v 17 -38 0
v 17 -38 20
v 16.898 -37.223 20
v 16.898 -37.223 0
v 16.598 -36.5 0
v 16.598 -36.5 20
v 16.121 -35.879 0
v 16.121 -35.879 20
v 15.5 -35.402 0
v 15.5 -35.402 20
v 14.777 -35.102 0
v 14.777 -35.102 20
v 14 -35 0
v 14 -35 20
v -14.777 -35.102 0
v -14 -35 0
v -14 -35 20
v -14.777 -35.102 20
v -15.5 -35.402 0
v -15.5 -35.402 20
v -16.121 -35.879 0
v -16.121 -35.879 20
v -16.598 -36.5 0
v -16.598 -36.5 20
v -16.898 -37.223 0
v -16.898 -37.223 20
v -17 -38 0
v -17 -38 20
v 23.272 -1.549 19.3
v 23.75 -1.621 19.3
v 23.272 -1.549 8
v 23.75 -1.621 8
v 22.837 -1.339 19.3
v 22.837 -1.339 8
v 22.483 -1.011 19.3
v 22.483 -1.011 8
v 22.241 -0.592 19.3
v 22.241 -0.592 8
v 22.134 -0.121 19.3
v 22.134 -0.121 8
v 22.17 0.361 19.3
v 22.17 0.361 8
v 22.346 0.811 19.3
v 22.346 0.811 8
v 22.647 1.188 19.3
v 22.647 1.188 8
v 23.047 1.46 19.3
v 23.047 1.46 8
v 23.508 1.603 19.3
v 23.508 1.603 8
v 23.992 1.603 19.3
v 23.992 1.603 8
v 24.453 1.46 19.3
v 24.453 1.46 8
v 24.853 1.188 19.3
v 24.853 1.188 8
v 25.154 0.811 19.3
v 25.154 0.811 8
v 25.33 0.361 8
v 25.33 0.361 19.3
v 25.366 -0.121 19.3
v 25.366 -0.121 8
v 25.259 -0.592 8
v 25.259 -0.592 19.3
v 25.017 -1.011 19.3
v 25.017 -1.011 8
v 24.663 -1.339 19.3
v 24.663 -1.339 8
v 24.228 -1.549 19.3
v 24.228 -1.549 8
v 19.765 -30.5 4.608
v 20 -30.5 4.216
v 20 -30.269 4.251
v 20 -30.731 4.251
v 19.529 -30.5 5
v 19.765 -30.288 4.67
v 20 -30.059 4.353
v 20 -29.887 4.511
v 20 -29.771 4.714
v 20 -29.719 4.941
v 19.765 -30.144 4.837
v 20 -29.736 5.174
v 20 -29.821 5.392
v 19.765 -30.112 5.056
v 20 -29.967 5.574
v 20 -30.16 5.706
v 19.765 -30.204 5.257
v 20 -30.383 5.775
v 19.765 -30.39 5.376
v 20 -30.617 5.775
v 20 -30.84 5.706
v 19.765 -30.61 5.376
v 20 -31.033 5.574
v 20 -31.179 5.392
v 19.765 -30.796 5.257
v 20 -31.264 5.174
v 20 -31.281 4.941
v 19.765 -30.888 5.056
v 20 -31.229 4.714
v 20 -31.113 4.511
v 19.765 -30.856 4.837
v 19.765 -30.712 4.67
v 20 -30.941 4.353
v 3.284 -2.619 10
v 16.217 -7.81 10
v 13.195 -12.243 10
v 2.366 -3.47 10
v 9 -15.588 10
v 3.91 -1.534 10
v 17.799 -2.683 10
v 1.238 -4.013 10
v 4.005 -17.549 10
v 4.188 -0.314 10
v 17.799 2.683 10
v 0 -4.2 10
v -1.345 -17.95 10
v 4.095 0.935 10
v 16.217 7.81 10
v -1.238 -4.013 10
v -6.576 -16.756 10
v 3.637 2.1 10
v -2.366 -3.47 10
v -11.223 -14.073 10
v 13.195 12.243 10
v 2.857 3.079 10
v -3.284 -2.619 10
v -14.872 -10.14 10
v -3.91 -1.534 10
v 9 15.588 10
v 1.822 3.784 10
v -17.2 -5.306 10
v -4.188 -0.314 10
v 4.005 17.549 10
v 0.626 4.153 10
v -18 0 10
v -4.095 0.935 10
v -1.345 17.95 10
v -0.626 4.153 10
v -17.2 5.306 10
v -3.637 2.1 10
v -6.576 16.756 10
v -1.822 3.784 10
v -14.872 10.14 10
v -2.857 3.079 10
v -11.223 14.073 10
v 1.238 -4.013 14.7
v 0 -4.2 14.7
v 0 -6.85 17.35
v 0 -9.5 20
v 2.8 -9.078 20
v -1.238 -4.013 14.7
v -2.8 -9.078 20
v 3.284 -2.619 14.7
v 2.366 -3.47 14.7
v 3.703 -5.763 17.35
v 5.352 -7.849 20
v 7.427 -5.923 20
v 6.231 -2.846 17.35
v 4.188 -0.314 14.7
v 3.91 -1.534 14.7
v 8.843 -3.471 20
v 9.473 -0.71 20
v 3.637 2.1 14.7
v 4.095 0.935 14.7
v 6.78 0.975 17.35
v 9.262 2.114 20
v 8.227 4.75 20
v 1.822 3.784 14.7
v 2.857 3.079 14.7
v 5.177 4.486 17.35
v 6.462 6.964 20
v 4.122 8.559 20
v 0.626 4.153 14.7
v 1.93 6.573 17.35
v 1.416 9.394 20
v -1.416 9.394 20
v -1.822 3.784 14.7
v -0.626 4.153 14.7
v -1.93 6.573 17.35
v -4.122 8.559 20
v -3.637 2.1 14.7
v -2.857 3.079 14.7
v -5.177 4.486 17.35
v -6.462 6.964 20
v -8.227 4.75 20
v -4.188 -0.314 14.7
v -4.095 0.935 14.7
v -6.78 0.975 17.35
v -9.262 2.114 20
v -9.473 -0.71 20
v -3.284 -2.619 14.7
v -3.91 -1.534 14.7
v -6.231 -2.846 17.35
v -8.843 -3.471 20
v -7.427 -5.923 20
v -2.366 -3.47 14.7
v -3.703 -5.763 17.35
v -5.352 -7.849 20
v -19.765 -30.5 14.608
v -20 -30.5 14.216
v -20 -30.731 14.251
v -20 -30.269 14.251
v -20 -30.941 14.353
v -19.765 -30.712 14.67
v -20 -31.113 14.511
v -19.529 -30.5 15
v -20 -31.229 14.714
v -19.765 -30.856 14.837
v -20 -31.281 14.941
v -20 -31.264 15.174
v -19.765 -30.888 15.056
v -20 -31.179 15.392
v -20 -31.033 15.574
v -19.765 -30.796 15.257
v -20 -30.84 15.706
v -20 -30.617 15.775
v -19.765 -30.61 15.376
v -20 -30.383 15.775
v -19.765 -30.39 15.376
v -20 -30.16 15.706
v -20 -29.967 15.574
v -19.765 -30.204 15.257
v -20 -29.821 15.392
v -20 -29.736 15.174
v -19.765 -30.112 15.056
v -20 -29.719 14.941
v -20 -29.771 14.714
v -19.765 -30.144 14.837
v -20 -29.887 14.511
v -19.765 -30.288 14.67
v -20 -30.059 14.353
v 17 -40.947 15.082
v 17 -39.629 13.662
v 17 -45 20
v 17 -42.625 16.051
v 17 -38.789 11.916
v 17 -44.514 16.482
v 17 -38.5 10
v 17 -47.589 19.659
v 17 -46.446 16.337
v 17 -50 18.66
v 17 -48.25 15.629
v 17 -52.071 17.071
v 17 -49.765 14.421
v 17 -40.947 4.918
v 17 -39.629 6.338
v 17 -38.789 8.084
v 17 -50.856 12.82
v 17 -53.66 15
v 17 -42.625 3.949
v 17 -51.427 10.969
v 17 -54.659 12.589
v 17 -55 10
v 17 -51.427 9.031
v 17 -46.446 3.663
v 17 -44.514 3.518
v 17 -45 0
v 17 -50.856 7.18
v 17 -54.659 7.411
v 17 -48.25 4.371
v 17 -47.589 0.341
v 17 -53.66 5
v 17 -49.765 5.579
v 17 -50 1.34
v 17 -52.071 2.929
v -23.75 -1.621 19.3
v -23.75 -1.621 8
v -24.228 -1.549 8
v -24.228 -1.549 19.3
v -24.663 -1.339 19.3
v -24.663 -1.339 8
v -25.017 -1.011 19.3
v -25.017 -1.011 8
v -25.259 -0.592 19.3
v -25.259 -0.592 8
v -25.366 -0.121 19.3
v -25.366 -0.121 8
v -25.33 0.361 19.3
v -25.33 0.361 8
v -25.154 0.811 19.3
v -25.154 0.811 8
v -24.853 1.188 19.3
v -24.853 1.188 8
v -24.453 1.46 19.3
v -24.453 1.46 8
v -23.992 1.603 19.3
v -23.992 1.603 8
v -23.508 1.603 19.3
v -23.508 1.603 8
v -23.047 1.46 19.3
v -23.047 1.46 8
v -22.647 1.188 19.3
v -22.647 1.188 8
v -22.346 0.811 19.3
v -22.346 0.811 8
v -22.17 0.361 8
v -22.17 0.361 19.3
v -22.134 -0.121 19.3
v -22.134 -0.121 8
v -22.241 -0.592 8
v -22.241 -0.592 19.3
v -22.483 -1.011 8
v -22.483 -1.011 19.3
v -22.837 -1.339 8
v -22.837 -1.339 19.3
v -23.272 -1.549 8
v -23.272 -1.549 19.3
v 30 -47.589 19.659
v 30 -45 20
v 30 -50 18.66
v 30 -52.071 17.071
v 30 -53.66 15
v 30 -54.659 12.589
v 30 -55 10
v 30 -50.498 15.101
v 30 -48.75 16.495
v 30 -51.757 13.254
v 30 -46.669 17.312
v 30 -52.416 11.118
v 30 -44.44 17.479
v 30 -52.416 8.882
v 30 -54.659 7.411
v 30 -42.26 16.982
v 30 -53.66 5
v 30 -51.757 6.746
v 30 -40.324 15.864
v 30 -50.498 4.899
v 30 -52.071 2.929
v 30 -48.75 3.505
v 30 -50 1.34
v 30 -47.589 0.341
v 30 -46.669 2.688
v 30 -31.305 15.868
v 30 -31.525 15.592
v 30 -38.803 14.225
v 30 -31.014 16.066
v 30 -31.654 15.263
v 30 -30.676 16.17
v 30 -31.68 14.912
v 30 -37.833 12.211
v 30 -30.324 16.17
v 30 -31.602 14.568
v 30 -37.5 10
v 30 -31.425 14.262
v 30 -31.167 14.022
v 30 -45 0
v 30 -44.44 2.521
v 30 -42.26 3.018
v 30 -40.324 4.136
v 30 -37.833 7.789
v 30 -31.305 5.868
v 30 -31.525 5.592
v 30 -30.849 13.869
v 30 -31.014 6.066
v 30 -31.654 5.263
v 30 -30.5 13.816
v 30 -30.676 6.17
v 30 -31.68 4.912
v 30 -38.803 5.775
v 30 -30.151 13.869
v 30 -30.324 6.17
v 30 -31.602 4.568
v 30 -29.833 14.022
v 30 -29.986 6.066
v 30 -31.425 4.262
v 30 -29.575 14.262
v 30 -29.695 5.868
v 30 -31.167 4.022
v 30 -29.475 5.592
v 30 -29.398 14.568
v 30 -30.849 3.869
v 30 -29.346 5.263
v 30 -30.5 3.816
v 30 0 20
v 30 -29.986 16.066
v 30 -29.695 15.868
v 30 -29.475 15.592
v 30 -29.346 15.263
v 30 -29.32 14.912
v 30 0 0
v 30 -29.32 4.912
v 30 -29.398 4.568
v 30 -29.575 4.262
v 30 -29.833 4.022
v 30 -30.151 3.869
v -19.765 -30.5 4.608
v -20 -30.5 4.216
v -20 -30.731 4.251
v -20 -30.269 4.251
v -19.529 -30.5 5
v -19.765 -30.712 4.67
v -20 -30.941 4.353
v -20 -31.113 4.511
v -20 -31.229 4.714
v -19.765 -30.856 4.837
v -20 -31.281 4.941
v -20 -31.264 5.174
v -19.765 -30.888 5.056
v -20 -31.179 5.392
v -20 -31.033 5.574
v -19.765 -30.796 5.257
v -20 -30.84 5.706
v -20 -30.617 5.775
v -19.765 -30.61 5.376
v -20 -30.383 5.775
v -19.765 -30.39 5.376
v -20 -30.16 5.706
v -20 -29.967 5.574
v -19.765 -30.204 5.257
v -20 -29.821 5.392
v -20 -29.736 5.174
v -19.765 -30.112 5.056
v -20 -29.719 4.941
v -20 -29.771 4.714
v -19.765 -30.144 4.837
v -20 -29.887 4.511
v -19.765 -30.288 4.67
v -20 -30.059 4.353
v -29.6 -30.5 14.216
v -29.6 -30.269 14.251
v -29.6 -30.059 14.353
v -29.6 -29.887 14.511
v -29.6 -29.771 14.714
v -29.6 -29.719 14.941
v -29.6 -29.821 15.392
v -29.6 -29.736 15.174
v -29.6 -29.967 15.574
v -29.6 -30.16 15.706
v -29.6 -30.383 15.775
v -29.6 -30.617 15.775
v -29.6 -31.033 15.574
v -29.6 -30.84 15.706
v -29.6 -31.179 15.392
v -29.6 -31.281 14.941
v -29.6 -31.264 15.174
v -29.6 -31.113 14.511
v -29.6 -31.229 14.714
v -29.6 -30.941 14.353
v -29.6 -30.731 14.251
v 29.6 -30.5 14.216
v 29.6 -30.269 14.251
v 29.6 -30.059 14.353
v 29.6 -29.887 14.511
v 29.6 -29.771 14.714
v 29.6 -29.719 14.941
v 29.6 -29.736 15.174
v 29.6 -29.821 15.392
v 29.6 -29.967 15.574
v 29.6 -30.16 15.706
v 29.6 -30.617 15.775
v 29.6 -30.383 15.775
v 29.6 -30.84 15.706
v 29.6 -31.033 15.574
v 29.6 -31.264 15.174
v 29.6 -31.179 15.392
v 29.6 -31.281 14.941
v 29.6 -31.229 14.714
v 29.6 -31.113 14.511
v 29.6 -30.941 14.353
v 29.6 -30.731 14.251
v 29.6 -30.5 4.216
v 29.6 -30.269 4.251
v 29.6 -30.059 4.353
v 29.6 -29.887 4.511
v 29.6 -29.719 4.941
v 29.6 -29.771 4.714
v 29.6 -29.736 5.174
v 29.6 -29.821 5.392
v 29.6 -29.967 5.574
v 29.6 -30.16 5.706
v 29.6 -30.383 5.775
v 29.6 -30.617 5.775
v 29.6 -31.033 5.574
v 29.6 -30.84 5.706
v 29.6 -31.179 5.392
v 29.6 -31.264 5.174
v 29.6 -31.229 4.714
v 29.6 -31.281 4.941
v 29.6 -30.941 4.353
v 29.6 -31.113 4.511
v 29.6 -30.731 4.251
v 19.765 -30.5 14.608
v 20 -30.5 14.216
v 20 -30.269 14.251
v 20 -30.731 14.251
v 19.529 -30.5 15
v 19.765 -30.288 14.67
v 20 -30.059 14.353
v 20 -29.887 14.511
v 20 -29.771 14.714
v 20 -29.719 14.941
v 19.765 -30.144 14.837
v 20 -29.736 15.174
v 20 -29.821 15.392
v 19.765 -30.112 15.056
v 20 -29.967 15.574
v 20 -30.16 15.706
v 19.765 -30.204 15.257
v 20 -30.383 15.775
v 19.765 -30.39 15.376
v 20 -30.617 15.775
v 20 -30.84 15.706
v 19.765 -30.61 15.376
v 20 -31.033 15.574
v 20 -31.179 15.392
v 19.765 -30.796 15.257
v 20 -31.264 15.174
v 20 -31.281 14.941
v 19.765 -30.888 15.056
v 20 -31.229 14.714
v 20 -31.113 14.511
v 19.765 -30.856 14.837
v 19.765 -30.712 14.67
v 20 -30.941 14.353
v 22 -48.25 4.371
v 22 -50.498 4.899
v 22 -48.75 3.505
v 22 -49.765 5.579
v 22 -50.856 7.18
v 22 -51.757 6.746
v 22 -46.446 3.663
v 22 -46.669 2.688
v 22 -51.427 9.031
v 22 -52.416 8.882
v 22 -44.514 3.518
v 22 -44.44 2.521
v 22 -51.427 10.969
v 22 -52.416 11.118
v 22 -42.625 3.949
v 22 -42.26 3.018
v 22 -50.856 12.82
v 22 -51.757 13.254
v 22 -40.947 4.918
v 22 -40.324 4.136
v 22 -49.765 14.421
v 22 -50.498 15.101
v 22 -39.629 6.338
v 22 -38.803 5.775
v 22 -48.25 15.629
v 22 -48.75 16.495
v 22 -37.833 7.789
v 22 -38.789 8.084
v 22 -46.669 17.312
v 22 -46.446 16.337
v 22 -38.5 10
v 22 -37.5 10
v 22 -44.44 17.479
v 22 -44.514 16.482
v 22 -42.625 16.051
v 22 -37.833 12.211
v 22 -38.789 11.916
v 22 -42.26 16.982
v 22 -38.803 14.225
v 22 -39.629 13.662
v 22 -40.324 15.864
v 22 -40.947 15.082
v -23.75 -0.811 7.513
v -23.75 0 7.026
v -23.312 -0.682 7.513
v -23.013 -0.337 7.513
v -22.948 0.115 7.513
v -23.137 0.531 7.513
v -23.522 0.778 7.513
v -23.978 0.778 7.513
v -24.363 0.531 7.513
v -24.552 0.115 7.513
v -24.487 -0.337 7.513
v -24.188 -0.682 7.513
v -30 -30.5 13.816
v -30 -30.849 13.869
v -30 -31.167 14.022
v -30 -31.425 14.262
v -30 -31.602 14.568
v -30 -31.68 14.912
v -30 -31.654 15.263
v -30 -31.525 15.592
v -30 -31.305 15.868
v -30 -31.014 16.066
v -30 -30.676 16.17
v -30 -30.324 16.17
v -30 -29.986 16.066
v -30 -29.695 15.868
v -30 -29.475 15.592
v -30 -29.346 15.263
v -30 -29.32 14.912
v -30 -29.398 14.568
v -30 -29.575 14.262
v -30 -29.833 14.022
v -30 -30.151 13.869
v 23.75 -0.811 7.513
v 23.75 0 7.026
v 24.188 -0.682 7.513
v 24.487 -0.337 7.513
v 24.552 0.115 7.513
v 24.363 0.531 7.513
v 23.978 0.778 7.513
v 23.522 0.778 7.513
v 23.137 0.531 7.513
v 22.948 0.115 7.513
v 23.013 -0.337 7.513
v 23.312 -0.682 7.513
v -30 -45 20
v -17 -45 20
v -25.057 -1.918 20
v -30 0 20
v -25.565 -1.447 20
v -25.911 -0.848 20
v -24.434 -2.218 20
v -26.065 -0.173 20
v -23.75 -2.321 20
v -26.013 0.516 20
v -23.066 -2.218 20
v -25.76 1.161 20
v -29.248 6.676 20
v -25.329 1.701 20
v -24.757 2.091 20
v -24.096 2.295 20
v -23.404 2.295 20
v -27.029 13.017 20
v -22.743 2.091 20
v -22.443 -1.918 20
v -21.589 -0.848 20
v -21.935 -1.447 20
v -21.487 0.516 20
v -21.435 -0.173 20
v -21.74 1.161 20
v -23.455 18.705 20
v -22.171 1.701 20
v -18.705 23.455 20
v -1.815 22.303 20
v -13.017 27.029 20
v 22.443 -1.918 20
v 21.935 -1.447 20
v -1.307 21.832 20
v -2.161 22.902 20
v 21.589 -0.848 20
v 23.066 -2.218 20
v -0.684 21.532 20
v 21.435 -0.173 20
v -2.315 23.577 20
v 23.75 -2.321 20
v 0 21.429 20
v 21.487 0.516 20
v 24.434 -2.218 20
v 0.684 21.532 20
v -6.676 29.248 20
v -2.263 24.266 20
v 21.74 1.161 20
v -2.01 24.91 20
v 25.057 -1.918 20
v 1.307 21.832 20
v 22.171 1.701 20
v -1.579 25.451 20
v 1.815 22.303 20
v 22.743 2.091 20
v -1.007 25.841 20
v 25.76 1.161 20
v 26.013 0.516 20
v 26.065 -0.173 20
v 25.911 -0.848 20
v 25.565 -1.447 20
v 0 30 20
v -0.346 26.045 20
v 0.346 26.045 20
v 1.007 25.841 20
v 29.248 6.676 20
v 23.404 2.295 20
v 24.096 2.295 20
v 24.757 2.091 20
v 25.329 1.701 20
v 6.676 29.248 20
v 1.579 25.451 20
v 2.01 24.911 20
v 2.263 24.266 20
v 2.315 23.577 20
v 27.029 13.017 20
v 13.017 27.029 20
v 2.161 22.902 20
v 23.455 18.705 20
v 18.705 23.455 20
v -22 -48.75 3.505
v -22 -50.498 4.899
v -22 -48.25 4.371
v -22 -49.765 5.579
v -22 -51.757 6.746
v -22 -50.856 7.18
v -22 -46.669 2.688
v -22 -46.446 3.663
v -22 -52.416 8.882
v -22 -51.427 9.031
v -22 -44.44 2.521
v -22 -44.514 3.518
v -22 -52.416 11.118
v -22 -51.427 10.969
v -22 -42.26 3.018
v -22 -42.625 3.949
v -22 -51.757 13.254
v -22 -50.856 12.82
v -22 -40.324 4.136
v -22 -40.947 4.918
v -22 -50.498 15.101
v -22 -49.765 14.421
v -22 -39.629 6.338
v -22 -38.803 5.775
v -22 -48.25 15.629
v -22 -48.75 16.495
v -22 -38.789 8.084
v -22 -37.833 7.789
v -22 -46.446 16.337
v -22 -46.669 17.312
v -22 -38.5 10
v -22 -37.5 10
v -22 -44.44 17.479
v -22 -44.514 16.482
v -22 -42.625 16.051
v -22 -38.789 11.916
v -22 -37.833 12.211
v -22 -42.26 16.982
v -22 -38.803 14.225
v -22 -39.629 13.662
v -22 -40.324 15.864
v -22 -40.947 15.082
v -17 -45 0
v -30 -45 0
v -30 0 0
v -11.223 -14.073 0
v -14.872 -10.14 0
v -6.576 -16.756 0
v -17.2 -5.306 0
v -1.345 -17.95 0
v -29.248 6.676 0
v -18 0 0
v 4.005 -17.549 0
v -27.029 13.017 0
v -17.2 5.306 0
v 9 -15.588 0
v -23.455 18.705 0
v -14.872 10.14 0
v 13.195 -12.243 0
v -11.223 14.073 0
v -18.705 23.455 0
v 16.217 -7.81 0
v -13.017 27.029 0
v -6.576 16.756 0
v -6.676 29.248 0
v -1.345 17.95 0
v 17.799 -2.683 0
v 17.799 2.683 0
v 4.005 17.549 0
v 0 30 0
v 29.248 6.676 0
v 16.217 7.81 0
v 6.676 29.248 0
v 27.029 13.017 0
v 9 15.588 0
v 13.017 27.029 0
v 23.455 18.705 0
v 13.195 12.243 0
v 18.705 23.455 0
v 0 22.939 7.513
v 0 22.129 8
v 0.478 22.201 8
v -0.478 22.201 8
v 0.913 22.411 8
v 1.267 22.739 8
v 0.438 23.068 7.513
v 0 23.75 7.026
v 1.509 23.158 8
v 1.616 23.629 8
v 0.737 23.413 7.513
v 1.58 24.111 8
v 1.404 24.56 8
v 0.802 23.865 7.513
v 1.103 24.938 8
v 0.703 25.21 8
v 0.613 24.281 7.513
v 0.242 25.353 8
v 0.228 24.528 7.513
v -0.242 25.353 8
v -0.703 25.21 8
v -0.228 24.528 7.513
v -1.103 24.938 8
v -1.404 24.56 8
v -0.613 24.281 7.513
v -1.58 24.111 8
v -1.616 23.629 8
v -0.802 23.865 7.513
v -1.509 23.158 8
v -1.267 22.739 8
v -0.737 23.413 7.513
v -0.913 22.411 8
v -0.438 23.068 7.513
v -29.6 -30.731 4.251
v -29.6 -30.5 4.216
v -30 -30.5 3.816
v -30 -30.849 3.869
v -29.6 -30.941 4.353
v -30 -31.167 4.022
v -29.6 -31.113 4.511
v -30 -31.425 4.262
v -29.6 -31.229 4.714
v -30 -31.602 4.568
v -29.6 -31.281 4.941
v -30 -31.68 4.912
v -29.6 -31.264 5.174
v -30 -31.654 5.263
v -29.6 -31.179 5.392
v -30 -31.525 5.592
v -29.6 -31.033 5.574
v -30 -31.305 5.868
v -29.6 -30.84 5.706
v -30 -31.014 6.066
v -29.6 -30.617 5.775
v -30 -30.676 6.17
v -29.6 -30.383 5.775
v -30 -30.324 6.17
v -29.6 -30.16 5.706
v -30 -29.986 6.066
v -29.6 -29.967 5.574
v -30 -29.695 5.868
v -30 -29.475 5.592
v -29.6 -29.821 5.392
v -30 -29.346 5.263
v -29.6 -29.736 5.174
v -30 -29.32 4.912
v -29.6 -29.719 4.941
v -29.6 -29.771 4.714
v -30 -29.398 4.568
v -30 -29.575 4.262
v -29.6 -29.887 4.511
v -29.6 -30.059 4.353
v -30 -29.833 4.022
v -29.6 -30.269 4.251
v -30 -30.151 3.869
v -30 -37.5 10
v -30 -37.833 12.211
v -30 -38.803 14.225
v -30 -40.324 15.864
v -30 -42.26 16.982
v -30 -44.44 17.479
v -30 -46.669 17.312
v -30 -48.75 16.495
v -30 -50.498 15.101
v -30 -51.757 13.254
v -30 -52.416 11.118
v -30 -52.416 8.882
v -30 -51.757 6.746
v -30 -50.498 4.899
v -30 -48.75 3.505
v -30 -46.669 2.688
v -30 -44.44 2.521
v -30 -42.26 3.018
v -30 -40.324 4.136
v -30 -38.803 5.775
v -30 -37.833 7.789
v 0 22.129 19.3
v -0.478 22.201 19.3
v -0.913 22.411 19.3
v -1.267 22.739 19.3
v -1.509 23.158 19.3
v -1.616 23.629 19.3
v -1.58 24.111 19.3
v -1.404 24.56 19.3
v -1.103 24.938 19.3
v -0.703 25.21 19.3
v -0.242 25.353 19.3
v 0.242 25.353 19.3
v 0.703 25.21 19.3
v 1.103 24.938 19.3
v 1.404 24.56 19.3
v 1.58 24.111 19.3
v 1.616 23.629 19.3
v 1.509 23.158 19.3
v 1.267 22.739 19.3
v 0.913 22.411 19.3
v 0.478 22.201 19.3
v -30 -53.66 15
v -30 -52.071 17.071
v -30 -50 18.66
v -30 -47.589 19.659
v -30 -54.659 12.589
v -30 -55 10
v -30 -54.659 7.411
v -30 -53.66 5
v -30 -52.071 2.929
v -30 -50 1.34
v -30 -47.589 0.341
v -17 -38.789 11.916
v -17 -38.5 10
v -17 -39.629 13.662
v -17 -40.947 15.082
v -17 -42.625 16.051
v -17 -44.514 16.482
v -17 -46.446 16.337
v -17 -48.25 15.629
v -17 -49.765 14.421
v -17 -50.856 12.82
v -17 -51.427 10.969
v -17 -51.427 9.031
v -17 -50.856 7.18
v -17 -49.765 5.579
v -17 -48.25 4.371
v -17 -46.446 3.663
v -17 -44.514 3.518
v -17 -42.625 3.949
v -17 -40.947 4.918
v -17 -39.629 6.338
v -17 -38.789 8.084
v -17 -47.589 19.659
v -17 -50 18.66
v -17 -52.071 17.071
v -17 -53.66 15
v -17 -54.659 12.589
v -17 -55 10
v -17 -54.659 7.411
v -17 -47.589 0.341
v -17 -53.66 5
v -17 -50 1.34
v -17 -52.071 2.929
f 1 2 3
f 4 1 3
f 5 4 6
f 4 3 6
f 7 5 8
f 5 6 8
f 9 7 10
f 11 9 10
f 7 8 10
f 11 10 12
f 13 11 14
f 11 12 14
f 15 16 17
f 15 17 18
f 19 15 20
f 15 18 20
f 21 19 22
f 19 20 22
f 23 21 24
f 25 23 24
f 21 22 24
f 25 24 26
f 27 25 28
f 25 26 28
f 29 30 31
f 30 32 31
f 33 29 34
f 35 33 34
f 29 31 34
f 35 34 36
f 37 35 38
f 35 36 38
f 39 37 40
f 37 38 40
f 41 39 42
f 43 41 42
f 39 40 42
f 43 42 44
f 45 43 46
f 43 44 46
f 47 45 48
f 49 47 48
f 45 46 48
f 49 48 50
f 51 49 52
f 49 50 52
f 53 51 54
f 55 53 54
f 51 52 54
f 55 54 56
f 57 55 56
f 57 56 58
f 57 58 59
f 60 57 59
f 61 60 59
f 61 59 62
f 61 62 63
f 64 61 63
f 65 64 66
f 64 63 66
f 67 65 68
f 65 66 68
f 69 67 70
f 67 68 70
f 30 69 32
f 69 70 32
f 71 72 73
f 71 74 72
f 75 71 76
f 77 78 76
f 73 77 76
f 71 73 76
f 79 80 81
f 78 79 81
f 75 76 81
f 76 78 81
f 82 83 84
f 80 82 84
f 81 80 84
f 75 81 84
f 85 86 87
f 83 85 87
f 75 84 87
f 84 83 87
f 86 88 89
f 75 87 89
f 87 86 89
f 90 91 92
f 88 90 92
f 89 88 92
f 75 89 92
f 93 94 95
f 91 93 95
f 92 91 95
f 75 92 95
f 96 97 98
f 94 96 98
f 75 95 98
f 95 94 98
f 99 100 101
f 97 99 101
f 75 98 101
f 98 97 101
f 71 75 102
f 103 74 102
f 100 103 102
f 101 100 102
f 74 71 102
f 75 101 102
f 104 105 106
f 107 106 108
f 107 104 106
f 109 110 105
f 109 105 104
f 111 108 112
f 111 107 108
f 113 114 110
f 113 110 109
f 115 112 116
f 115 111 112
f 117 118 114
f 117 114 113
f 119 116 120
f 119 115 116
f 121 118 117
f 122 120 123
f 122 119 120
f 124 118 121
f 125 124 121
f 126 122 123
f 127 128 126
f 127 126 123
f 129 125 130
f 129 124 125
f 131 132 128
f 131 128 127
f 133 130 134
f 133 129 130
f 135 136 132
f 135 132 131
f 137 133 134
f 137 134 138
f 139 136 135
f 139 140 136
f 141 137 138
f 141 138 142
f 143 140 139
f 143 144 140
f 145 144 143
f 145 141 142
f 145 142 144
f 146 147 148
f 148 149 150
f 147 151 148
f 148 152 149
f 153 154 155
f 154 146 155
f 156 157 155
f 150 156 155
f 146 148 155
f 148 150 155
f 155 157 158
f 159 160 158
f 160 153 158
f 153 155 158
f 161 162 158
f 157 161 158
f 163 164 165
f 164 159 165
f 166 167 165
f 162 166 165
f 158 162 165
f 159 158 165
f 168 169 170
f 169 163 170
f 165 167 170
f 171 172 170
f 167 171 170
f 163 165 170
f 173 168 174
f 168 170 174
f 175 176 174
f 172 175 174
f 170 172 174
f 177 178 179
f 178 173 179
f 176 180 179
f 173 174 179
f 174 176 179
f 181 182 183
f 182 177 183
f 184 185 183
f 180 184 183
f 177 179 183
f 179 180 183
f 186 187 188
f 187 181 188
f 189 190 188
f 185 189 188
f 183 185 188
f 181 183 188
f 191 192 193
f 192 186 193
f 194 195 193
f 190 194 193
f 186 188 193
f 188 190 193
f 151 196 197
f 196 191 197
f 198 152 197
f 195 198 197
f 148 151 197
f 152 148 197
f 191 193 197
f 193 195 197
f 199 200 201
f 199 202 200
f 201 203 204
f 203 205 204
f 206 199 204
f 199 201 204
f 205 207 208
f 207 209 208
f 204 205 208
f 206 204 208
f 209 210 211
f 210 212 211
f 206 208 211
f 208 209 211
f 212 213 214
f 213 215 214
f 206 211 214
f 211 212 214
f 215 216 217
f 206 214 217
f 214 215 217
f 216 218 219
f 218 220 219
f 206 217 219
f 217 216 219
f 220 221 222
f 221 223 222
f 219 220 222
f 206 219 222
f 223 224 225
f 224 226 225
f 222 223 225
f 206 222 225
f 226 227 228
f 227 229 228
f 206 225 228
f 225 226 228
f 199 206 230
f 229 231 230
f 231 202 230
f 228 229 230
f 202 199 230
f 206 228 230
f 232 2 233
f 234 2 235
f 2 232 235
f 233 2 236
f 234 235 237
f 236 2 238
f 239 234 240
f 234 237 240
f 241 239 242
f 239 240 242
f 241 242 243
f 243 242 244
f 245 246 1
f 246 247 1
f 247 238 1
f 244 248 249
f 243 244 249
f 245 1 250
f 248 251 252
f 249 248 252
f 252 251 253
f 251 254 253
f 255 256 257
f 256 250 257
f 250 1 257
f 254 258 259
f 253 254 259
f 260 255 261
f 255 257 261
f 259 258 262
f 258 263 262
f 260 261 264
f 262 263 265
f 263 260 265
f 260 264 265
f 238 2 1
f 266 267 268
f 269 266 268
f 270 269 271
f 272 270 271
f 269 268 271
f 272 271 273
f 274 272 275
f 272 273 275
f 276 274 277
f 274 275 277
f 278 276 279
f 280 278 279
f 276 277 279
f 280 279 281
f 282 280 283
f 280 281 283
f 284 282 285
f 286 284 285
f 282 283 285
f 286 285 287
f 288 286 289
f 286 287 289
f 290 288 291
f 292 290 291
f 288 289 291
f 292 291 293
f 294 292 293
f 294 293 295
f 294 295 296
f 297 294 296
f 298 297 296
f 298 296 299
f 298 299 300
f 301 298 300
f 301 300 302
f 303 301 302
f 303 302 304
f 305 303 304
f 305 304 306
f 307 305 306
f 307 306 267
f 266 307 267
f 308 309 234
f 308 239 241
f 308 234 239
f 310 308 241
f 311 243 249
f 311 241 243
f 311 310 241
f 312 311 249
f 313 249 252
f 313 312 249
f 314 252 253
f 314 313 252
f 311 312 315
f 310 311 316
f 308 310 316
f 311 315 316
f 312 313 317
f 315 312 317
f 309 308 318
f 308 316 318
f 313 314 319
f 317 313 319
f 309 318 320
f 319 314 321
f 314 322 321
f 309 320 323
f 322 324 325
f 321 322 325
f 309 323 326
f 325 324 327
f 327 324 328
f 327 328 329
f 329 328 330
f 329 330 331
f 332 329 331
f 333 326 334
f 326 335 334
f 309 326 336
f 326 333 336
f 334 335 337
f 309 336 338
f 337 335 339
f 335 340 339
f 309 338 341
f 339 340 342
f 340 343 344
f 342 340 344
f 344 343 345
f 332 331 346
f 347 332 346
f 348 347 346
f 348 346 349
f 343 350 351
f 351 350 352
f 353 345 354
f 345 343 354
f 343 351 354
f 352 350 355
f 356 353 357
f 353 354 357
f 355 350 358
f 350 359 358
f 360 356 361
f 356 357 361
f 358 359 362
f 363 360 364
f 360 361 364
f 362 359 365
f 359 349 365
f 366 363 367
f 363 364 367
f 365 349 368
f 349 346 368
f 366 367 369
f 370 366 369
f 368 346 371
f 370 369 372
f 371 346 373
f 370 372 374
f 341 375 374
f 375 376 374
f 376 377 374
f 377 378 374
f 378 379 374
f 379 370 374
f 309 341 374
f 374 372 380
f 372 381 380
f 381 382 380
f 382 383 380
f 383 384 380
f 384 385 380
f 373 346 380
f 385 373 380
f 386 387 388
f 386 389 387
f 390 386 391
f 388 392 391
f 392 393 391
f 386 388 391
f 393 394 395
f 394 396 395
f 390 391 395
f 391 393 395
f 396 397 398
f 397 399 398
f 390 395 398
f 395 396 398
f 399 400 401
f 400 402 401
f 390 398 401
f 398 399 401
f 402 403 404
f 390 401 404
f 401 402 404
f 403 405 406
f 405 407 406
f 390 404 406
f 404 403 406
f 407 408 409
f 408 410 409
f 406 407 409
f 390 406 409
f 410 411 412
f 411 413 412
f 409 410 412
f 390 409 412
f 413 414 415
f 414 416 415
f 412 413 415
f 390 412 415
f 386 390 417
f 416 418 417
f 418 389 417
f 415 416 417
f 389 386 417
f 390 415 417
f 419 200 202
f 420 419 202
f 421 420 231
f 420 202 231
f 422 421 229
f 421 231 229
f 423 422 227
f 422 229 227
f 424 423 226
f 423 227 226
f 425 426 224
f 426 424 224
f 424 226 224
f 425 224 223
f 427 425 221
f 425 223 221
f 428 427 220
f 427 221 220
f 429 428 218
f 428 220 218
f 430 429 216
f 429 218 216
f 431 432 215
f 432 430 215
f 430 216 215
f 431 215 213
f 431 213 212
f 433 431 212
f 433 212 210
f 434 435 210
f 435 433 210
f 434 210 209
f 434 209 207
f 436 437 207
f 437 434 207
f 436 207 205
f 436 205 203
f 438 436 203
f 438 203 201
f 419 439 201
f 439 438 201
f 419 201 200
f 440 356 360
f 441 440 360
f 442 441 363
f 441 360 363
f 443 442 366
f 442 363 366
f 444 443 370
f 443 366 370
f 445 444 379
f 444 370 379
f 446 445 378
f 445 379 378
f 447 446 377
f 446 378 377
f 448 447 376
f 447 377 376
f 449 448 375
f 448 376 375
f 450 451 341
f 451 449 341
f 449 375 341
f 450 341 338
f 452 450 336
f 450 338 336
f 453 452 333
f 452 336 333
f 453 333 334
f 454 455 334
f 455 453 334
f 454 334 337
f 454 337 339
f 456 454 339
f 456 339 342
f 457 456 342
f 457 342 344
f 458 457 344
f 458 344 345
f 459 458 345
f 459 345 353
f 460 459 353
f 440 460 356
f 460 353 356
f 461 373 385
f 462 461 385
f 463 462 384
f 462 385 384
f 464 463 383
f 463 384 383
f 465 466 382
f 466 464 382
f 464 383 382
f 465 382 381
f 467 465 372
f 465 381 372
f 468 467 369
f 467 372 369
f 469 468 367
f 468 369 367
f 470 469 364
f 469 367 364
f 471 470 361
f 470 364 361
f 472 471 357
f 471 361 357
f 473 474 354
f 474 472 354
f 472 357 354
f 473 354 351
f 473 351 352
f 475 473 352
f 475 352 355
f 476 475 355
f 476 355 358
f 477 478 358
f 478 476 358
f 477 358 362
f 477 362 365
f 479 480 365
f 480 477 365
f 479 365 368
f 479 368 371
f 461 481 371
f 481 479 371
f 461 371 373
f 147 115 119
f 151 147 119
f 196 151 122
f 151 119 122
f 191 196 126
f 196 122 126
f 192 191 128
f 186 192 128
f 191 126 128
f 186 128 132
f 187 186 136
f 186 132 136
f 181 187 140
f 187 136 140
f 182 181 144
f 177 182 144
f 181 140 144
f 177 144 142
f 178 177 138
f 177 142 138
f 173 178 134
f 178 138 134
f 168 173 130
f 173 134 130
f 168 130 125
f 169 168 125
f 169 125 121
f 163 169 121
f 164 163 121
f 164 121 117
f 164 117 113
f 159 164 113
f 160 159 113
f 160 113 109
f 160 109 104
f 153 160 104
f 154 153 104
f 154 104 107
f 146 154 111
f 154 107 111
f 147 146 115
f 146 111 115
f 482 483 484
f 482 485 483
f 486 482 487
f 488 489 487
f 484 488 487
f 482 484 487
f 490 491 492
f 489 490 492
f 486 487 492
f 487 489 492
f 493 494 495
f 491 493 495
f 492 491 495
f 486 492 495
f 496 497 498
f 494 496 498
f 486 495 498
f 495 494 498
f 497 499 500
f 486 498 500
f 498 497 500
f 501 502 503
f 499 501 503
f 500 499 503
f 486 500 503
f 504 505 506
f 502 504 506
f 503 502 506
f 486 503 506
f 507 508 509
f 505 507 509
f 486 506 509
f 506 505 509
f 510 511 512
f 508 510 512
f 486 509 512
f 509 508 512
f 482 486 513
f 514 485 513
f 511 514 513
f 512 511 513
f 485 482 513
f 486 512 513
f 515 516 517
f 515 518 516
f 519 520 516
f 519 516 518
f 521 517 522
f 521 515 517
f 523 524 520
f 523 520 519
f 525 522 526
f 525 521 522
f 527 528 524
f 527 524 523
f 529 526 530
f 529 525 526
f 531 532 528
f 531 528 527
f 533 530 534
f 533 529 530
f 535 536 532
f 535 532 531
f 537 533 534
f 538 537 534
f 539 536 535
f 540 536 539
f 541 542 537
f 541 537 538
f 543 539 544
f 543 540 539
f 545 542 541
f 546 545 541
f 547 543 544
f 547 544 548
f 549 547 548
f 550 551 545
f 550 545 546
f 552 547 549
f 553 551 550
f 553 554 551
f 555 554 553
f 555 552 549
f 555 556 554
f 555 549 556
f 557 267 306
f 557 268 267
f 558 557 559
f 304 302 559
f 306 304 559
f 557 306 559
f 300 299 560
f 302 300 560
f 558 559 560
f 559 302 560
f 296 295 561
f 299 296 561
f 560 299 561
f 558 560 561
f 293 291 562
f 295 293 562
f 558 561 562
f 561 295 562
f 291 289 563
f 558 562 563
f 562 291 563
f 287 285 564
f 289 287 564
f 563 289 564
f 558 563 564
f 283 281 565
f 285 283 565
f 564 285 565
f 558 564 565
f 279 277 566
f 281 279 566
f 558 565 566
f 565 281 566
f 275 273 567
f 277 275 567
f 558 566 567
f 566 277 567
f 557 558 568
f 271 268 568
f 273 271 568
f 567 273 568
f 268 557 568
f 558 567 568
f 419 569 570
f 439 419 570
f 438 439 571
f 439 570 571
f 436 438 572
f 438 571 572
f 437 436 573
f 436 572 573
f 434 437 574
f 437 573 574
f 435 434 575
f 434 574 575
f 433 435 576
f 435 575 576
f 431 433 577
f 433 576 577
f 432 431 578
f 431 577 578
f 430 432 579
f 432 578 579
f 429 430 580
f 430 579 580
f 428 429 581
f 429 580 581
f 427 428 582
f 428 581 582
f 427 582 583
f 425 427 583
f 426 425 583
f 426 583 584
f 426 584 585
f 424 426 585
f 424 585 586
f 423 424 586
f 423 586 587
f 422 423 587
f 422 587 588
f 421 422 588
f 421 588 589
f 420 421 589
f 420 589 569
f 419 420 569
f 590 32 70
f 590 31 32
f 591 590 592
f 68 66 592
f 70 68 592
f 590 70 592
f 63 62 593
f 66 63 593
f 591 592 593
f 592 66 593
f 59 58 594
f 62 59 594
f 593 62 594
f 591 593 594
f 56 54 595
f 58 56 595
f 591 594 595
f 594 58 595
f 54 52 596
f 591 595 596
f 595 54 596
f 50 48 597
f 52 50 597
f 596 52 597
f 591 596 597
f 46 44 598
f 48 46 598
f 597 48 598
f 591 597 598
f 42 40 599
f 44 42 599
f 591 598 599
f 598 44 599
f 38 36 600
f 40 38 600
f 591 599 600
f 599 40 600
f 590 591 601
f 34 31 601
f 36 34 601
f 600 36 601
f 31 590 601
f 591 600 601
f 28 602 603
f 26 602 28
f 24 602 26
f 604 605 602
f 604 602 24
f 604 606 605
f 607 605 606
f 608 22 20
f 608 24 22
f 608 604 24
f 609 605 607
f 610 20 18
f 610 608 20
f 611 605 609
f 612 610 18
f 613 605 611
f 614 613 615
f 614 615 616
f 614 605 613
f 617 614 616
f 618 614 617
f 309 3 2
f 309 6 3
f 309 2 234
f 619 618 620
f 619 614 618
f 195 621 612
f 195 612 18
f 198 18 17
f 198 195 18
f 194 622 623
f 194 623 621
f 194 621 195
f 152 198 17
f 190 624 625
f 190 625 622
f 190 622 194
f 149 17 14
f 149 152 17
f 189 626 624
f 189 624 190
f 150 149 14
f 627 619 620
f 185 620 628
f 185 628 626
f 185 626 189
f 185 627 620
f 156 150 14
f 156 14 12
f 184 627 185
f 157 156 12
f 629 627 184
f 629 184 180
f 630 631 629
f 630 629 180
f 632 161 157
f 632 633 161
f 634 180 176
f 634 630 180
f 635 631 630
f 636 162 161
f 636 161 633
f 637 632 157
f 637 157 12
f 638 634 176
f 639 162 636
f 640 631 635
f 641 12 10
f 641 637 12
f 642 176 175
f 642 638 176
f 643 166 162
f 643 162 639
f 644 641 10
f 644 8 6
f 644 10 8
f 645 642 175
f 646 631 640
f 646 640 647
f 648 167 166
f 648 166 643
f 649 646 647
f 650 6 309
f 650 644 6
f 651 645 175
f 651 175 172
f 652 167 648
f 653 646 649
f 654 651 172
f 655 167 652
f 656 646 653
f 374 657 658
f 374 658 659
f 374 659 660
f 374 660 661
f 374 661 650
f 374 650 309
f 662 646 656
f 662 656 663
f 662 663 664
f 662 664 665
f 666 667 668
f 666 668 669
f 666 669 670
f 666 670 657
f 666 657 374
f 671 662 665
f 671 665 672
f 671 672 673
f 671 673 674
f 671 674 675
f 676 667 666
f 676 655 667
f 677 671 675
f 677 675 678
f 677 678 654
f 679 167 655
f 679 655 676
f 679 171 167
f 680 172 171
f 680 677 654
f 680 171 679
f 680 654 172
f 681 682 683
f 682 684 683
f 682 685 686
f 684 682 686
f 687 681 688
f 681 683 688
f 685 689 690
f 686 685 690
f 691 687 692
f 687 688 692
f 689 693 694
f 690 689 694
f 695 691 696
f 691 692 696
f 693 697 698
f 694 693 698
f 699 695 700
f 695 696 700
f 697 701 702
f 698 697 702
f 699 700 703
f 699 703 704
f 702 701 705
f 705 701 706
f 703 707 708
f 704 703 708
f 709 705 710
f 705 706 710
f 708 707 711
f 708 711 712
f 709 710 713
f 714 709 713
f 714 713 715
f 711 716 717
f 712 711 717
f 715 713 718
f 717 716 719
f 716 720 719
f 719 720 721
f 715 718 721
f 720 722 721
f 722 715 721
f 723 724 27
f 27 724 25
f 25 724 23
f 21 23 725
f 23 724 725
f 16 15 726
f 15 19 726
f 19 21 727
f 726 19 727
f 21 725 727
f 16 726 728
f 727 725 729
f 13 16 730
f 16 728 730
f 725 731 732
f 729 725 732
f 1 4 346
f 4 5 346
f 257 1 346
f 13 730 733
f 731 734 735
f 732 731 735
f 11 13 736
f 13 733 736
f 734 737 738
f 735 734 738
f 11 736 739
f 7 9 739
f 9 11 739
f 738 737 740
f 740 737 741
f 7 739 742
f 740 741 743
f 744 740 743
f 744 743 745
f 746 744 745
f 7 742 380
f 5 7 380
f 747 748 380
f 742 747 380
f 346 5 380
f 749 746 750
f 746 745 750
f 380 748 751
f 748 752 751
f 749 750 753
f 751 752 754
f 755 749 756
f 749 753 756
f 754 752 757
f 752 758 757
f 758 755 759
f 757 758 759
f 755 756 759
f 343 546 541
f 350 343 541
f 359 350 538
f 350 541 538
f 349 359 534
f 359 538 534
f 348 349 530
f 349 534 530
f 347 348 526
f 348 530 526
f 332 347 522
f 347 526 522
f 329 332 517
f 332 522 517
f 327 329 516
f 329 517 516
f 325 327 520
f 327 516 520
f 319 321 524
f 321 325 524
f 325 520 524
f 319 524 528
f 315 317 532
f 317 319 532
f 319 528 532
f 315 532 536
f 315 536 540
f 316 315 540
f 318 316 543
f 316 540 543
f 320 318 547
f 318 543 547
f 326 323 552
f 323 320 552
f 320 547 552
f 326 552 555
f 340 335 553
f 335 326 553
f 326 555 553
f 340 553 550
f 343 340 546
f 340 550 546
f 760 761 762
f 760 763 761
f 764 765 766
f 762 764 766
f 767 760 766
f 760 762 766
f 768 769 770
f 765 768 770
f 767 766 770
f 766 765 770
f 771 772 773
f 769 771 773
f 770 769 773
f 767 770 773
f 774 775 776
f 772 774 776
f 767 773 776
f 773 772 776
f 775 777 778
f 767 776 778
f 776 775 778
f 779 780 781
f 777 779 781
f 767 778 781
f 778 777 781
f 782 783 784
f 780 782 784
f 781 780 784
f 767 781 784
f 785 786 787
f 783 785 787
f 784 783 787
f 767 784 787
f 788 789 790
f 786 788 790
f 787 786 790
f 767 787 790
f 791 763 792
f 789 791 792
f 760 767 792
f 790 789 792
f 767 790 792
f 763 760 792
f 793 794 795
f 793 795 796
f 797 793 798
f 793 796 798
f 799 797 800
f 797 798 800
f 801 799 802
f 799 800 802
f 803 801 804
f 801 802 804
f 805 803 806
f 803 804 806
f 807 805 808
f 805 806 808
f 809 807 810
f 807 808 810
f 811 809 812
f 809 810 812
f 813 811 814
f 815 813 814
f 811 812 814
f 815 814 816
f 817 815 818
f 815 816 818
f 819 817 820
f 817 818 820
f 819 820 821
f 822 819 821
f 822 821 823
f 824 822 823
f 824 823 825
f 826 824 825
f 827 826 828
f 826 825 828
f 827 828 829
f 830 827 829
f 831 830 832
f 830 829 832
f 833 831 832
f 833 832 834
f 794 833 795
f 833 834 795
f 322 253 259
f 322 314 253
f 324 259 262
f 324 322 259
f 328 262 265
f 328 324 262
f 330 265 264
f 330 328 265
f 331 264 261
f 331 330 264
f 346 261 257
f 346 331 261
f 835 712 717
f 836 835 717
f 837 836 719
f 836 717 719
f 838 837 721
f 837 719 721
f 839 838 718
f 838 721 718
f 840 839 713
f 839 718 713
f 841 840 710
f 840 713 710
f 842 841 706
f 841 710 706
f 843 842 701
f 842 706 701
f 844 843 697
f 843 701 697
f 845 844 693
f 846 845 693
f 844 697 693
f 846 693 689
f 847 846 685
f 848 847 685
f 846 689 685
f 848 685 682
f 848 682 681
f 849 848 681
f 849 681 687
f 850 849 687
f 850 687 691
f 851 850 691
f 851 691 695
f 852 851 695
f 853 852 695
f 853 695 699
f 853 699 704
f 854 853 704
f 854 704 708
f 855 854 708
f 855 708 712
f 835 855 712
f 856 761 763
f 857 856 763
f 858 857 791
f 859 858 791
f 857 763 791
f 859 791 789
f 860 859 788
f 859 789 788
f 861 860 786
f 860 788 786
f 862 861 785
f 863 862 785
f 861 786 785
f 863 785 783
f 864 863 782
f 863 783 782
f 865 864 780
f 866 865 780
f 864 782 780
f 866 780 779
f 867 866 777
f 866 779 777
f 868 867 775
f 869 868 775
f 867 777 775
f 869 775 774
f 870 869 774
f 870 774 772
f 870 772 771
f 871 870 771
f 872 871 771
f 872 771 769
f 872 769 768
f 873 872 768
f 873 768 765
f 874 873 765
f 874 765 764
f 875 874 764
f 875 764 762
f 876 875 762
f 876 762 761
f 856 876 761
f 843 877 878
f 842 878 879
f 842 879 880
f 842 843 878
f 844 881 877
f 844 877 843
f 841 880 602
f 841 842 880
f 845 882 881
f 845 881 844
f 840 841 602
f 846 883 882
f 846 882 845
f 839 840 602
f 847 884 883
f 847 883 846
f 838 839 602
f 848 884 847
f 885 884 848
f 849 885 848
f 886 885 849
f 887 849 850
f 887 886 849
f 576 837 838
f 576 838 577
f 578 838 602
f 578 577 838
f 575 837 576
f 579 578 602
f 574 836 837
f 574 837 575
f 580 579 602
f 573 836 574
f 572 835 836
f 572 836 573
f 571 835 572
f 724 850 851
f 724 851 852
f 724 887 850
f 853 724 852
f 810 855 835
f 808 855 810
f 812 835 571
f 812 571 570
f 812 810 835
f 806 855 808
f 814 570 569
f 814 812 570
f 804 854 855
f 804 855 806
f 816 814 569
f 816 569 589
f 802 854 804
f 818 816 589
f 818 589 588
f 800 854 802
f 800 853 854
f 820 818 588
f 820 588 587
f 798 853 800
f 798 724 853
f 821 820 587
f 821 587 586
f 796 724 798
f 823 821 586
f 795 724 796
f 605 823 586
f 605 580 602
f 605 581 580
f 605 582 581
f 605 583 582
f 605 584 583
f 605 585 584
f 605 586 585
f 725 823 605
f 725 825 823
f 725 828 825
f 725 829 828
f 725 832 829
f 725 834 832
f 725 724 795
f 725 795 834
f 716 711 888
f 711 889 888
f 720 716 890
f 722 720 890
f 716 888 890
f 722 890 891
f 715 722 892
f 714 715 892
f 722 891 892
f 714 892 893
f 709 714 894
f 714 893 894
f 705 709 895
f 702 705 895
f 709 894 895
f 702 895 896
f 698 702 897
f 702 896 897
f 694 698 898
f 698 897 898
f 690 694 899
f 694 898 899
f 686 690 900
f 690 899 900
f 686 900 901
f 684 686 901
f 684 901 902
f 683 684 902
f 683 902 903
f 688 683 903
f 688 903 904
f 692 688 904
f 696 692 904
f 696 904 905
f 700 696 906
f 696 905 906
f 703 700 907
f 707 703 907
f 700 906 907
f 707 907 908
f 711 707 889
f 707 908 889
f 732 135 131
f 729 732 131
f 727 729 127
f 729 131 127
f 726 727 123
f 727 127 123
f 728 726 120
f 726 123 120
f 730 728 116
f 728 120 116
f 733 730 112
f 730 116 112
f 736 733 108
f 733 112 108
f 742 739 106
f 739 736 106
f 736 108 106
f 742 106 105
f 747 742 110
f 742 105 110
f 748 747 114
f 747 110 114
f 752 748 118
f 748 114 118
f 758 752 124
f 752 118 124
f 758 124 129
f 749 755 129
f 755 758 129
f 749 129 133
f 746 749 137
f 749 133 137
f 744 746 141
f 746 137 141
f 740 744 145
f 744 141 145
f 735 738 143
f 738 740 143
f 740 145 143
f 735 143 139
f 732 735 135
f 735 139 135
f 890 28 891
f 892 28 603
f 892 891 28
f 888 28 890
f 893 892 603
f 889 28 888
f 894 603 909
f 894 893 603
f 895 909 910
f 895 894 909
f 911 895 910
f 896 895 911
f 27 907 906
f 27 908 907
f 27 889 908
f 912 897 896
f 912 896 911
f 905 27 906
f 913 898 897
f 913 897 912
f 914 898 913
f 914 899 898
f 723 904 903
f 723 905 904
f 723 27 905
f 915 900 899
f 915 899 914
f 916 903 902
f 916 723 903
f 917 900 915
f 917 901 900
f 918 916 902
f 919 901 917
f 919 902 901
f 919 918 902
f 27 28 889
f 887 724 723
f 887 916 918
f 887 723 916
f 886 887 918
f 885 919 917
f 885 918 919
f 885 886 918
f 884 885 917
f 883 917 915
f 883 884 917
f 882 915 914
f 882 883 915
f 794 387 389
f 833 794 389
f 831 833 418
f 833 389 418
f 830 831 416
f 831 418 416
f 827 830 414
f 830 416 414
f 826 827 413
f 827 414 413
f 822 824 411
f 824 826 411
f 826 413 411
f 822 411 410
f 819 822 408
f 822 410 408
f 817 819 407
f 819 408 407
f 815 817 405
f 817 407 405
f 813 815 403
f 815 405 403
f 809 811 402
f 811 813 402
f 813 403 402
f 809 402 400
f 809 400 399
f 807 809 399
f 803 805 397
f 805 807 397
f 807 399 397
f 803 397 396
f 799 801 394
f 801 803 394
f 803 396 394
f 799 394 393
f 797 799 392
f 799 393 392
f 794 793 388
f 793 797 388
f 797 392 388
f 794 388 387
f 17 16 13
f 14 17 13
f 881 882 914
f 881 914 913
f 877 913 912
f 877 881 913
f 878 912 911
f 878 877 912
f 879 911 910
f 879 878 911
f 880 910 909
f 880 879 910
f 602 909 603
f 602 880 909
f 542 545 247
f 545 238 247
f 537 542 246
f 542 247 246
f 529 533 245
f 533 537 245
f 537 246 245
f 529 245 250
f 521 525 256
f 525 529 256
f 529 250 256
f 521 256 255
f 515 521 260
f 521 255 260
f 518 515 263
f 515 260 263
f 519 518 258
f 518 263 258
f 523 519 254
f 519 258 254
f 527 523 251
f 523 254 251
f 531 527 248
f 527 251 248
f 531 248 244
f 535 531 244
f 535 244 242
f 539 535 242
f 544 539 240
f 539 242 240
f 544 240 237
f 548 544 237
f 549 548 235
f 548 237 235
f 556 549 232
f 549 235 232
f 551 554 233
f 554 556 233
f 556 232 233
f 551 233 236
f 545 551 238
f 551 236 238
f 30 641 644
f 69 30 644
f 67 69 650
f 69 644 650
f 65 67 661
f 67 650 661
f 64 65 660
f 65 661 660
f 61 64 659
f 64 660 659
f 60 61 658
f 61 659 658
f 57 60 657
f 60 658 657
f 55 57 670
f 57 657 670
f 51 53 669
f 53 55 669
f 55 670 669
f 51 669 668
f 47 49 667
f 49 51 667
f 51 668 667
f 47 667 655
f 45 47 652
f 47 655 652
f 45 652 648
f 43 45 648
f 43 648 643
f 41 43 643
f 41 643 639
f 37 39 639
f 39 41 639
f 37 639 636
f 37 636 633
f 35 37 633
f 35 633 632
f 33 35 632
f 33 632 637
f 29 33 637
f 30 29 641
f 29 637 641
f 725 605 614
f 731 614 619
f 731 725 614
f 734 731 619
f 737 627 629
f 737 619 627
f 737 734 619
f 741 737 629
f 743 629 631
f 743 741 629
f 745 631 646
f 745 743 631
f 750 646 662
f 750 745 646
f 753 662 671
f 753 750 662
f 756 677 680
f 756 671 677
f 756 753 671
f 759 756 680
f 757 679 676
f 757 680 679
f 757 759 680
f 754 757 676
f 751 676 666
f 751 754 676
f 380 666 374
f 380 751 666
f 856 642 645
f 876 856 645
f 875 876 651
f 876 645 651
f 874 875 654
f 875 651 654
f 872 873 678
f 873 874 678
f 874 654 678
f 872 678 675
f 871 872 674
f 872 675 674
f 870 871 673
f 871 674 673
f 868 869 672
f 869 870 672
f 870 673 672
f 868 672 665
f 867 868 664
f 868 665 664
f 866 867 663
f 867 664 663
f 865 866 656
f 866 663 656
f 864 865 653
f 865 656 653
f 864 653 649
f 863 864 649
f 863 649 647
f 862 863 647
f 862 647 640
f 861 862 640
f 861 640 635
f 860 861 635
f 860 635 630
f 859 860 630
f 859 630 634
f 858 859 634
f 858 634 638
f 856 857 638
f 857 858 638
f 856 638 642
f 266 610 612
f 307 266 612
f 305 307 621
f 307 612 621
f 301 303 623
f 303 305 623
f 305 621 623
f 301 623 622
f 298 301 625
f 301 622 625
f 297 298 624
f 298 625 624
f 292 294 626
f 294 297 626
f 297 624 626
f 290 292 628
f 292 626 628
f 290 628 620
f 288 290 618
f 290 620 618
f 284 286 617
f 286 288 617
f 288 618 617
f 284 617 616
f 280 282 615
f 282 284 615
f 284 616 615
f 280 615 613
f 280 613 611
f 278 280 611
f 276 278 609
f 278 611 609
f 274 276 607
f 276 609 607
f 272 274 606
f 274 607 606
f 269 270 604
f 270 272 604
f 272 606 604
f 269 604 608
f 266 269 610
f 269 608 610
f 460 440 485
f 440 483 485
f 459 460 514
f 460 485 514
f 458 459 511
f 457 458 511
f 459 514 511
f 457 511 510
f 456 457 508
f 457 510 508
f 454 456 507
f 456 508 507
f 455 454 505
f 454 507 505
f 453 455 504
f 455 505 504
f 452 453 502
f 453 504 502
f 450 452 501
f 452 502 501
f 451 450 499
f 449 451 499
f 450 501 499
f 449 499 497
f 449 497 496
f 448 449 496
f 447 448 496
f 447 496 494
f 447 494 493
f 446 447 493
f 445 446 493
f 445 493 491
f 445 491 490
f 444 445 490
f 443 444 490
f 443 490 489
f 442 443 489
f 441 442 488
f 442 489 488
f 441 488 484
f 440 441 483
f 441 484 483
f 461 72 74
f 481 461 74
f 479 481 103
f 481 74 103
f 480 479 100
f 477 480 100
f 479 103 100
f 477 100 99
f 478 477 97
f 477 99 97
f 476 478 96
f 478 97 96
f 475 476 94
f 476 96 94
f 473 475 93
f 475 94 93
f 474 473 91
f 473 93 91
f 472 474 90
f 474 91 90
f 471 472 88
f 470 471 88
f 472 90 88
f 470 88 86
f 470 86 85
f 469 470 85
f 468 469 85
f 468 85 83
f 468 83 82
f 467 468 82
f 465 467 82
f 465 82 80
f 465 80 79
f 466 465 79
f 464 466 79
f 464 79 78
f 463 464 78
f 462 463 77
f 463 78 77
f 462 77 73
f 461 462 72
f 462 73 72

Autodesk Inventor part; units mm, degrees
ref_plane "YZ Plane" through (0, 0, 0) normal (1, 0, 0) x (0, 1, 0)
sketch "Skizze1" plane through (0, 0, 0) normal (0, 0, 1) x (1, 0, 0)
  arc A0 (30, 0) -> (-30, 0) centre (0, 0) ccw
  line L0 (-17, -35) -> (-17, -55)
  line L1 (-17, -55) -> (-30, -55)
  line L2 (-30, -55) -> (-30, 0)
  line L3 (0, 0) -> (0, 30) construction
  line L4 (17, -35) -> (17, -55)
  line L5 (17, -55) -> (30, -55)
  line L6 (30, -55) -> (30, 0)
  line L7 (-17, -35) -> (17, -35)
  dimension "SJ_D_out" = 60
  dimension "d1" = 55
  dimension "d2" = 17
  dimension "d3" = 35
  dimension "d34" = 13
extrude "Grundform" add sketch "Skizze1" along normal blind 20
fillet "Konturverrundungen" radius 10 4 edges at (-23.5, -55, 20) (23.5, -55, 20) (-23.5, -55, 0) (23.5, -55, 0)
fillet "Konturverrundungen" radius 3 2 edges at (-17, -35, 10) (17, -35, 10)
ref_plane "Konstruktionshilfsebene" through (0, 0, 0) normal (0, -1, 0) x (1, 0, 0)
ref_plane "Arbeitsebene1" through (0, 30, 0) normal (0, -1, 0) x (1, 0, 0)
sketch "Skizze2" plane through (0, 0, 0) normal (0, -1, 0) x (1, 0, 0)
  line L0 (-30, 0) -> (-17, 0) construction
  line L1 (-18, 0) -> (-18, 10)
  line L2 (-17, 20) -> (-17, 0) construction
  line L3 (-18, 10) -> (0, 10)
  line L4 (0, 10) -> (0, 0)
  line L5 (-17, 0) -> (-14, 0) construction
  line L6 (-18, 0) -> (0, 0)
  dimension "d11" = 36
  dimension "d12" = 10
revolve "Wellenaufnahme" cut sketch "Skizze2" angle 360 about axis through (0, 0, 10) along (0, 0, -1)
sketch "Skizze3" plane through (0, 0, 20) normal (0, 0, 1) x (1, 0, 0)
  point P0 (0, 0)
  point P1 (0, 0)
hole "Senkung für M8 Innensechskantschraube" at (0, 0, 20) direction (0, 0, -1) diameter 8.4 end through all countersink diameter 19 countersink angle 90 clearance for "Innensechskant-Senkkopfschraube DIN EN ISO 10642" size "M8" standard "DIN"
ref_plane "Konstruktionshilfsebene:2" through (0, 0, 10) normal (0, 0, -1) x (-1, 0, 0)
sketch "Skizze4" plane through (0, 0, 10) normal (0, 0, -1) x (-1, 0, 0)
  line L0 (-30, -45) -> (-30, 0) construction
  line L1 (-17, -38.5) -> (-17, -45)
  line L2 (-30, -45) -> (-17, -45) projected
  line L3 (-17, -45) -> (-30, -45)
  line L4 (-30, -45) -> (-30, -37.5)
  line L5 (0, 0) -> (0, -35) construction
  line L6 (14, -35) -> (-14, -35) construction
  line L7 (-17, -38) -> (-17, -45) construction
  line L8 (42, -45) -> (-42, -45) construction
  line L9 (-30, -37.5) -> (-22, -37.5)
  line L10 (-22, -37.5) -> (-22, -38.5)
  line L11 (-22, -38.5) -> (-17, -38.5)
  line L12 (17, -38.5) -> (17, -45)
  line L13 (30, -45) -> (17, -45)
  line L14 (17, -45) -> (30, -45)
  line L15 (30, -45) -> (30, -37.5)
  line L16 (30, -37.5) -> (22, -37.5)
  line L17 (22, -37.5) -> (22, -38.5)
  line L18 (22, -38.5) -> (17, -38.5)
  dimension "d35" = 13
  dimension "d39" = 15
  dimension "d40" = 8
revolve "Axial-Radial Nadellager Innenprofil" cut sketch "Skizze4" angle 360 about axis through (8.5, -45, 10) along (1, 0, 0)
sketch "Skizze5" plane through (30, 0, 20) normal (1, 0, 0) x (0, 0, -1)
  circle A0 centre (5, -30.5) radius 1.2 construction
  circle A1 centre (15, -30.5) radius 1.2 construction
  point P0 (20, 0)
hole "Gewinde_Keine_ISO Metrisches Profil_2_Winkel(2)" at (30, -30.5, 15) at (30, -30.5, 5) direction (-1, 0, 0) diameter 1.567 depth 10 tip angle 118 thread size "M2x0.4" class "6H" standard "ISO Metric profile"
ref_plane "Spiegelebene" through (0, 0, 20) normal (1, 0, 0) x (0, 0, -1)
mirror "Gewindebohrung gespiegelt" about plane through (0, 0, 20) normal (1, 0, 0) of "Gewinde_Keine_ISO Metrisches Profil_2_Winkel(2)"
chamfer "Ansenkung Gewindebohrung M2x0,4mm" distance 0.4 angle 45 4 edges at (30, -30.5, 15.7835) (30, -30.5, 5.7835) (-30, -30.5, 15.7835) (-30, -30.5, 5.7835)
sketch "Sketch6" plane through (0, 0, 20) normal (0, 0, 1) x (1, 0, 0)
  circle A0 centre (0, 0) radius 4.2 construction
  circle A1 centre (0, 0) radius 23.75 construction
  circle A2 centre (0, 0) radius 9.5 construction
  line L0 (0, 0) -> (0, 23.75) construction
  line L1 (23.75, 0) -> (-23.75, 0) construction
  line L2 (0, 0) -> (23.75, 0) construction
  dimension "FixHole_Rad" = 23.75
  dimension "FixHole_Side_Angle" = 90
hole "Hole3" at (0, 23.75, 20) at (-23.75, 0, 20) at (23.75, 0, 20) direction (0, 0, -1) diameter 3.242 depth 12 tip angle 118 thread size "M4x0.7" class "6H" standard "ISO Metric profile"
chamfer "Chamfer2" distance 0.7 angle 45 3 edges at (-23.75, 1.621, 20) (23.75, 1.621, 20) (0, 25.371, 20)
ref_plane "Arbeitsebene5" through (0, 0, 20) normal (1, 0, 0) x (0, 0, -1)
equation "\"d6\" = 0.5 * d4"
equation "\"d4\" = 20"
properties part number "Shoulder_Joint_v2" material "PVC-Piping"
